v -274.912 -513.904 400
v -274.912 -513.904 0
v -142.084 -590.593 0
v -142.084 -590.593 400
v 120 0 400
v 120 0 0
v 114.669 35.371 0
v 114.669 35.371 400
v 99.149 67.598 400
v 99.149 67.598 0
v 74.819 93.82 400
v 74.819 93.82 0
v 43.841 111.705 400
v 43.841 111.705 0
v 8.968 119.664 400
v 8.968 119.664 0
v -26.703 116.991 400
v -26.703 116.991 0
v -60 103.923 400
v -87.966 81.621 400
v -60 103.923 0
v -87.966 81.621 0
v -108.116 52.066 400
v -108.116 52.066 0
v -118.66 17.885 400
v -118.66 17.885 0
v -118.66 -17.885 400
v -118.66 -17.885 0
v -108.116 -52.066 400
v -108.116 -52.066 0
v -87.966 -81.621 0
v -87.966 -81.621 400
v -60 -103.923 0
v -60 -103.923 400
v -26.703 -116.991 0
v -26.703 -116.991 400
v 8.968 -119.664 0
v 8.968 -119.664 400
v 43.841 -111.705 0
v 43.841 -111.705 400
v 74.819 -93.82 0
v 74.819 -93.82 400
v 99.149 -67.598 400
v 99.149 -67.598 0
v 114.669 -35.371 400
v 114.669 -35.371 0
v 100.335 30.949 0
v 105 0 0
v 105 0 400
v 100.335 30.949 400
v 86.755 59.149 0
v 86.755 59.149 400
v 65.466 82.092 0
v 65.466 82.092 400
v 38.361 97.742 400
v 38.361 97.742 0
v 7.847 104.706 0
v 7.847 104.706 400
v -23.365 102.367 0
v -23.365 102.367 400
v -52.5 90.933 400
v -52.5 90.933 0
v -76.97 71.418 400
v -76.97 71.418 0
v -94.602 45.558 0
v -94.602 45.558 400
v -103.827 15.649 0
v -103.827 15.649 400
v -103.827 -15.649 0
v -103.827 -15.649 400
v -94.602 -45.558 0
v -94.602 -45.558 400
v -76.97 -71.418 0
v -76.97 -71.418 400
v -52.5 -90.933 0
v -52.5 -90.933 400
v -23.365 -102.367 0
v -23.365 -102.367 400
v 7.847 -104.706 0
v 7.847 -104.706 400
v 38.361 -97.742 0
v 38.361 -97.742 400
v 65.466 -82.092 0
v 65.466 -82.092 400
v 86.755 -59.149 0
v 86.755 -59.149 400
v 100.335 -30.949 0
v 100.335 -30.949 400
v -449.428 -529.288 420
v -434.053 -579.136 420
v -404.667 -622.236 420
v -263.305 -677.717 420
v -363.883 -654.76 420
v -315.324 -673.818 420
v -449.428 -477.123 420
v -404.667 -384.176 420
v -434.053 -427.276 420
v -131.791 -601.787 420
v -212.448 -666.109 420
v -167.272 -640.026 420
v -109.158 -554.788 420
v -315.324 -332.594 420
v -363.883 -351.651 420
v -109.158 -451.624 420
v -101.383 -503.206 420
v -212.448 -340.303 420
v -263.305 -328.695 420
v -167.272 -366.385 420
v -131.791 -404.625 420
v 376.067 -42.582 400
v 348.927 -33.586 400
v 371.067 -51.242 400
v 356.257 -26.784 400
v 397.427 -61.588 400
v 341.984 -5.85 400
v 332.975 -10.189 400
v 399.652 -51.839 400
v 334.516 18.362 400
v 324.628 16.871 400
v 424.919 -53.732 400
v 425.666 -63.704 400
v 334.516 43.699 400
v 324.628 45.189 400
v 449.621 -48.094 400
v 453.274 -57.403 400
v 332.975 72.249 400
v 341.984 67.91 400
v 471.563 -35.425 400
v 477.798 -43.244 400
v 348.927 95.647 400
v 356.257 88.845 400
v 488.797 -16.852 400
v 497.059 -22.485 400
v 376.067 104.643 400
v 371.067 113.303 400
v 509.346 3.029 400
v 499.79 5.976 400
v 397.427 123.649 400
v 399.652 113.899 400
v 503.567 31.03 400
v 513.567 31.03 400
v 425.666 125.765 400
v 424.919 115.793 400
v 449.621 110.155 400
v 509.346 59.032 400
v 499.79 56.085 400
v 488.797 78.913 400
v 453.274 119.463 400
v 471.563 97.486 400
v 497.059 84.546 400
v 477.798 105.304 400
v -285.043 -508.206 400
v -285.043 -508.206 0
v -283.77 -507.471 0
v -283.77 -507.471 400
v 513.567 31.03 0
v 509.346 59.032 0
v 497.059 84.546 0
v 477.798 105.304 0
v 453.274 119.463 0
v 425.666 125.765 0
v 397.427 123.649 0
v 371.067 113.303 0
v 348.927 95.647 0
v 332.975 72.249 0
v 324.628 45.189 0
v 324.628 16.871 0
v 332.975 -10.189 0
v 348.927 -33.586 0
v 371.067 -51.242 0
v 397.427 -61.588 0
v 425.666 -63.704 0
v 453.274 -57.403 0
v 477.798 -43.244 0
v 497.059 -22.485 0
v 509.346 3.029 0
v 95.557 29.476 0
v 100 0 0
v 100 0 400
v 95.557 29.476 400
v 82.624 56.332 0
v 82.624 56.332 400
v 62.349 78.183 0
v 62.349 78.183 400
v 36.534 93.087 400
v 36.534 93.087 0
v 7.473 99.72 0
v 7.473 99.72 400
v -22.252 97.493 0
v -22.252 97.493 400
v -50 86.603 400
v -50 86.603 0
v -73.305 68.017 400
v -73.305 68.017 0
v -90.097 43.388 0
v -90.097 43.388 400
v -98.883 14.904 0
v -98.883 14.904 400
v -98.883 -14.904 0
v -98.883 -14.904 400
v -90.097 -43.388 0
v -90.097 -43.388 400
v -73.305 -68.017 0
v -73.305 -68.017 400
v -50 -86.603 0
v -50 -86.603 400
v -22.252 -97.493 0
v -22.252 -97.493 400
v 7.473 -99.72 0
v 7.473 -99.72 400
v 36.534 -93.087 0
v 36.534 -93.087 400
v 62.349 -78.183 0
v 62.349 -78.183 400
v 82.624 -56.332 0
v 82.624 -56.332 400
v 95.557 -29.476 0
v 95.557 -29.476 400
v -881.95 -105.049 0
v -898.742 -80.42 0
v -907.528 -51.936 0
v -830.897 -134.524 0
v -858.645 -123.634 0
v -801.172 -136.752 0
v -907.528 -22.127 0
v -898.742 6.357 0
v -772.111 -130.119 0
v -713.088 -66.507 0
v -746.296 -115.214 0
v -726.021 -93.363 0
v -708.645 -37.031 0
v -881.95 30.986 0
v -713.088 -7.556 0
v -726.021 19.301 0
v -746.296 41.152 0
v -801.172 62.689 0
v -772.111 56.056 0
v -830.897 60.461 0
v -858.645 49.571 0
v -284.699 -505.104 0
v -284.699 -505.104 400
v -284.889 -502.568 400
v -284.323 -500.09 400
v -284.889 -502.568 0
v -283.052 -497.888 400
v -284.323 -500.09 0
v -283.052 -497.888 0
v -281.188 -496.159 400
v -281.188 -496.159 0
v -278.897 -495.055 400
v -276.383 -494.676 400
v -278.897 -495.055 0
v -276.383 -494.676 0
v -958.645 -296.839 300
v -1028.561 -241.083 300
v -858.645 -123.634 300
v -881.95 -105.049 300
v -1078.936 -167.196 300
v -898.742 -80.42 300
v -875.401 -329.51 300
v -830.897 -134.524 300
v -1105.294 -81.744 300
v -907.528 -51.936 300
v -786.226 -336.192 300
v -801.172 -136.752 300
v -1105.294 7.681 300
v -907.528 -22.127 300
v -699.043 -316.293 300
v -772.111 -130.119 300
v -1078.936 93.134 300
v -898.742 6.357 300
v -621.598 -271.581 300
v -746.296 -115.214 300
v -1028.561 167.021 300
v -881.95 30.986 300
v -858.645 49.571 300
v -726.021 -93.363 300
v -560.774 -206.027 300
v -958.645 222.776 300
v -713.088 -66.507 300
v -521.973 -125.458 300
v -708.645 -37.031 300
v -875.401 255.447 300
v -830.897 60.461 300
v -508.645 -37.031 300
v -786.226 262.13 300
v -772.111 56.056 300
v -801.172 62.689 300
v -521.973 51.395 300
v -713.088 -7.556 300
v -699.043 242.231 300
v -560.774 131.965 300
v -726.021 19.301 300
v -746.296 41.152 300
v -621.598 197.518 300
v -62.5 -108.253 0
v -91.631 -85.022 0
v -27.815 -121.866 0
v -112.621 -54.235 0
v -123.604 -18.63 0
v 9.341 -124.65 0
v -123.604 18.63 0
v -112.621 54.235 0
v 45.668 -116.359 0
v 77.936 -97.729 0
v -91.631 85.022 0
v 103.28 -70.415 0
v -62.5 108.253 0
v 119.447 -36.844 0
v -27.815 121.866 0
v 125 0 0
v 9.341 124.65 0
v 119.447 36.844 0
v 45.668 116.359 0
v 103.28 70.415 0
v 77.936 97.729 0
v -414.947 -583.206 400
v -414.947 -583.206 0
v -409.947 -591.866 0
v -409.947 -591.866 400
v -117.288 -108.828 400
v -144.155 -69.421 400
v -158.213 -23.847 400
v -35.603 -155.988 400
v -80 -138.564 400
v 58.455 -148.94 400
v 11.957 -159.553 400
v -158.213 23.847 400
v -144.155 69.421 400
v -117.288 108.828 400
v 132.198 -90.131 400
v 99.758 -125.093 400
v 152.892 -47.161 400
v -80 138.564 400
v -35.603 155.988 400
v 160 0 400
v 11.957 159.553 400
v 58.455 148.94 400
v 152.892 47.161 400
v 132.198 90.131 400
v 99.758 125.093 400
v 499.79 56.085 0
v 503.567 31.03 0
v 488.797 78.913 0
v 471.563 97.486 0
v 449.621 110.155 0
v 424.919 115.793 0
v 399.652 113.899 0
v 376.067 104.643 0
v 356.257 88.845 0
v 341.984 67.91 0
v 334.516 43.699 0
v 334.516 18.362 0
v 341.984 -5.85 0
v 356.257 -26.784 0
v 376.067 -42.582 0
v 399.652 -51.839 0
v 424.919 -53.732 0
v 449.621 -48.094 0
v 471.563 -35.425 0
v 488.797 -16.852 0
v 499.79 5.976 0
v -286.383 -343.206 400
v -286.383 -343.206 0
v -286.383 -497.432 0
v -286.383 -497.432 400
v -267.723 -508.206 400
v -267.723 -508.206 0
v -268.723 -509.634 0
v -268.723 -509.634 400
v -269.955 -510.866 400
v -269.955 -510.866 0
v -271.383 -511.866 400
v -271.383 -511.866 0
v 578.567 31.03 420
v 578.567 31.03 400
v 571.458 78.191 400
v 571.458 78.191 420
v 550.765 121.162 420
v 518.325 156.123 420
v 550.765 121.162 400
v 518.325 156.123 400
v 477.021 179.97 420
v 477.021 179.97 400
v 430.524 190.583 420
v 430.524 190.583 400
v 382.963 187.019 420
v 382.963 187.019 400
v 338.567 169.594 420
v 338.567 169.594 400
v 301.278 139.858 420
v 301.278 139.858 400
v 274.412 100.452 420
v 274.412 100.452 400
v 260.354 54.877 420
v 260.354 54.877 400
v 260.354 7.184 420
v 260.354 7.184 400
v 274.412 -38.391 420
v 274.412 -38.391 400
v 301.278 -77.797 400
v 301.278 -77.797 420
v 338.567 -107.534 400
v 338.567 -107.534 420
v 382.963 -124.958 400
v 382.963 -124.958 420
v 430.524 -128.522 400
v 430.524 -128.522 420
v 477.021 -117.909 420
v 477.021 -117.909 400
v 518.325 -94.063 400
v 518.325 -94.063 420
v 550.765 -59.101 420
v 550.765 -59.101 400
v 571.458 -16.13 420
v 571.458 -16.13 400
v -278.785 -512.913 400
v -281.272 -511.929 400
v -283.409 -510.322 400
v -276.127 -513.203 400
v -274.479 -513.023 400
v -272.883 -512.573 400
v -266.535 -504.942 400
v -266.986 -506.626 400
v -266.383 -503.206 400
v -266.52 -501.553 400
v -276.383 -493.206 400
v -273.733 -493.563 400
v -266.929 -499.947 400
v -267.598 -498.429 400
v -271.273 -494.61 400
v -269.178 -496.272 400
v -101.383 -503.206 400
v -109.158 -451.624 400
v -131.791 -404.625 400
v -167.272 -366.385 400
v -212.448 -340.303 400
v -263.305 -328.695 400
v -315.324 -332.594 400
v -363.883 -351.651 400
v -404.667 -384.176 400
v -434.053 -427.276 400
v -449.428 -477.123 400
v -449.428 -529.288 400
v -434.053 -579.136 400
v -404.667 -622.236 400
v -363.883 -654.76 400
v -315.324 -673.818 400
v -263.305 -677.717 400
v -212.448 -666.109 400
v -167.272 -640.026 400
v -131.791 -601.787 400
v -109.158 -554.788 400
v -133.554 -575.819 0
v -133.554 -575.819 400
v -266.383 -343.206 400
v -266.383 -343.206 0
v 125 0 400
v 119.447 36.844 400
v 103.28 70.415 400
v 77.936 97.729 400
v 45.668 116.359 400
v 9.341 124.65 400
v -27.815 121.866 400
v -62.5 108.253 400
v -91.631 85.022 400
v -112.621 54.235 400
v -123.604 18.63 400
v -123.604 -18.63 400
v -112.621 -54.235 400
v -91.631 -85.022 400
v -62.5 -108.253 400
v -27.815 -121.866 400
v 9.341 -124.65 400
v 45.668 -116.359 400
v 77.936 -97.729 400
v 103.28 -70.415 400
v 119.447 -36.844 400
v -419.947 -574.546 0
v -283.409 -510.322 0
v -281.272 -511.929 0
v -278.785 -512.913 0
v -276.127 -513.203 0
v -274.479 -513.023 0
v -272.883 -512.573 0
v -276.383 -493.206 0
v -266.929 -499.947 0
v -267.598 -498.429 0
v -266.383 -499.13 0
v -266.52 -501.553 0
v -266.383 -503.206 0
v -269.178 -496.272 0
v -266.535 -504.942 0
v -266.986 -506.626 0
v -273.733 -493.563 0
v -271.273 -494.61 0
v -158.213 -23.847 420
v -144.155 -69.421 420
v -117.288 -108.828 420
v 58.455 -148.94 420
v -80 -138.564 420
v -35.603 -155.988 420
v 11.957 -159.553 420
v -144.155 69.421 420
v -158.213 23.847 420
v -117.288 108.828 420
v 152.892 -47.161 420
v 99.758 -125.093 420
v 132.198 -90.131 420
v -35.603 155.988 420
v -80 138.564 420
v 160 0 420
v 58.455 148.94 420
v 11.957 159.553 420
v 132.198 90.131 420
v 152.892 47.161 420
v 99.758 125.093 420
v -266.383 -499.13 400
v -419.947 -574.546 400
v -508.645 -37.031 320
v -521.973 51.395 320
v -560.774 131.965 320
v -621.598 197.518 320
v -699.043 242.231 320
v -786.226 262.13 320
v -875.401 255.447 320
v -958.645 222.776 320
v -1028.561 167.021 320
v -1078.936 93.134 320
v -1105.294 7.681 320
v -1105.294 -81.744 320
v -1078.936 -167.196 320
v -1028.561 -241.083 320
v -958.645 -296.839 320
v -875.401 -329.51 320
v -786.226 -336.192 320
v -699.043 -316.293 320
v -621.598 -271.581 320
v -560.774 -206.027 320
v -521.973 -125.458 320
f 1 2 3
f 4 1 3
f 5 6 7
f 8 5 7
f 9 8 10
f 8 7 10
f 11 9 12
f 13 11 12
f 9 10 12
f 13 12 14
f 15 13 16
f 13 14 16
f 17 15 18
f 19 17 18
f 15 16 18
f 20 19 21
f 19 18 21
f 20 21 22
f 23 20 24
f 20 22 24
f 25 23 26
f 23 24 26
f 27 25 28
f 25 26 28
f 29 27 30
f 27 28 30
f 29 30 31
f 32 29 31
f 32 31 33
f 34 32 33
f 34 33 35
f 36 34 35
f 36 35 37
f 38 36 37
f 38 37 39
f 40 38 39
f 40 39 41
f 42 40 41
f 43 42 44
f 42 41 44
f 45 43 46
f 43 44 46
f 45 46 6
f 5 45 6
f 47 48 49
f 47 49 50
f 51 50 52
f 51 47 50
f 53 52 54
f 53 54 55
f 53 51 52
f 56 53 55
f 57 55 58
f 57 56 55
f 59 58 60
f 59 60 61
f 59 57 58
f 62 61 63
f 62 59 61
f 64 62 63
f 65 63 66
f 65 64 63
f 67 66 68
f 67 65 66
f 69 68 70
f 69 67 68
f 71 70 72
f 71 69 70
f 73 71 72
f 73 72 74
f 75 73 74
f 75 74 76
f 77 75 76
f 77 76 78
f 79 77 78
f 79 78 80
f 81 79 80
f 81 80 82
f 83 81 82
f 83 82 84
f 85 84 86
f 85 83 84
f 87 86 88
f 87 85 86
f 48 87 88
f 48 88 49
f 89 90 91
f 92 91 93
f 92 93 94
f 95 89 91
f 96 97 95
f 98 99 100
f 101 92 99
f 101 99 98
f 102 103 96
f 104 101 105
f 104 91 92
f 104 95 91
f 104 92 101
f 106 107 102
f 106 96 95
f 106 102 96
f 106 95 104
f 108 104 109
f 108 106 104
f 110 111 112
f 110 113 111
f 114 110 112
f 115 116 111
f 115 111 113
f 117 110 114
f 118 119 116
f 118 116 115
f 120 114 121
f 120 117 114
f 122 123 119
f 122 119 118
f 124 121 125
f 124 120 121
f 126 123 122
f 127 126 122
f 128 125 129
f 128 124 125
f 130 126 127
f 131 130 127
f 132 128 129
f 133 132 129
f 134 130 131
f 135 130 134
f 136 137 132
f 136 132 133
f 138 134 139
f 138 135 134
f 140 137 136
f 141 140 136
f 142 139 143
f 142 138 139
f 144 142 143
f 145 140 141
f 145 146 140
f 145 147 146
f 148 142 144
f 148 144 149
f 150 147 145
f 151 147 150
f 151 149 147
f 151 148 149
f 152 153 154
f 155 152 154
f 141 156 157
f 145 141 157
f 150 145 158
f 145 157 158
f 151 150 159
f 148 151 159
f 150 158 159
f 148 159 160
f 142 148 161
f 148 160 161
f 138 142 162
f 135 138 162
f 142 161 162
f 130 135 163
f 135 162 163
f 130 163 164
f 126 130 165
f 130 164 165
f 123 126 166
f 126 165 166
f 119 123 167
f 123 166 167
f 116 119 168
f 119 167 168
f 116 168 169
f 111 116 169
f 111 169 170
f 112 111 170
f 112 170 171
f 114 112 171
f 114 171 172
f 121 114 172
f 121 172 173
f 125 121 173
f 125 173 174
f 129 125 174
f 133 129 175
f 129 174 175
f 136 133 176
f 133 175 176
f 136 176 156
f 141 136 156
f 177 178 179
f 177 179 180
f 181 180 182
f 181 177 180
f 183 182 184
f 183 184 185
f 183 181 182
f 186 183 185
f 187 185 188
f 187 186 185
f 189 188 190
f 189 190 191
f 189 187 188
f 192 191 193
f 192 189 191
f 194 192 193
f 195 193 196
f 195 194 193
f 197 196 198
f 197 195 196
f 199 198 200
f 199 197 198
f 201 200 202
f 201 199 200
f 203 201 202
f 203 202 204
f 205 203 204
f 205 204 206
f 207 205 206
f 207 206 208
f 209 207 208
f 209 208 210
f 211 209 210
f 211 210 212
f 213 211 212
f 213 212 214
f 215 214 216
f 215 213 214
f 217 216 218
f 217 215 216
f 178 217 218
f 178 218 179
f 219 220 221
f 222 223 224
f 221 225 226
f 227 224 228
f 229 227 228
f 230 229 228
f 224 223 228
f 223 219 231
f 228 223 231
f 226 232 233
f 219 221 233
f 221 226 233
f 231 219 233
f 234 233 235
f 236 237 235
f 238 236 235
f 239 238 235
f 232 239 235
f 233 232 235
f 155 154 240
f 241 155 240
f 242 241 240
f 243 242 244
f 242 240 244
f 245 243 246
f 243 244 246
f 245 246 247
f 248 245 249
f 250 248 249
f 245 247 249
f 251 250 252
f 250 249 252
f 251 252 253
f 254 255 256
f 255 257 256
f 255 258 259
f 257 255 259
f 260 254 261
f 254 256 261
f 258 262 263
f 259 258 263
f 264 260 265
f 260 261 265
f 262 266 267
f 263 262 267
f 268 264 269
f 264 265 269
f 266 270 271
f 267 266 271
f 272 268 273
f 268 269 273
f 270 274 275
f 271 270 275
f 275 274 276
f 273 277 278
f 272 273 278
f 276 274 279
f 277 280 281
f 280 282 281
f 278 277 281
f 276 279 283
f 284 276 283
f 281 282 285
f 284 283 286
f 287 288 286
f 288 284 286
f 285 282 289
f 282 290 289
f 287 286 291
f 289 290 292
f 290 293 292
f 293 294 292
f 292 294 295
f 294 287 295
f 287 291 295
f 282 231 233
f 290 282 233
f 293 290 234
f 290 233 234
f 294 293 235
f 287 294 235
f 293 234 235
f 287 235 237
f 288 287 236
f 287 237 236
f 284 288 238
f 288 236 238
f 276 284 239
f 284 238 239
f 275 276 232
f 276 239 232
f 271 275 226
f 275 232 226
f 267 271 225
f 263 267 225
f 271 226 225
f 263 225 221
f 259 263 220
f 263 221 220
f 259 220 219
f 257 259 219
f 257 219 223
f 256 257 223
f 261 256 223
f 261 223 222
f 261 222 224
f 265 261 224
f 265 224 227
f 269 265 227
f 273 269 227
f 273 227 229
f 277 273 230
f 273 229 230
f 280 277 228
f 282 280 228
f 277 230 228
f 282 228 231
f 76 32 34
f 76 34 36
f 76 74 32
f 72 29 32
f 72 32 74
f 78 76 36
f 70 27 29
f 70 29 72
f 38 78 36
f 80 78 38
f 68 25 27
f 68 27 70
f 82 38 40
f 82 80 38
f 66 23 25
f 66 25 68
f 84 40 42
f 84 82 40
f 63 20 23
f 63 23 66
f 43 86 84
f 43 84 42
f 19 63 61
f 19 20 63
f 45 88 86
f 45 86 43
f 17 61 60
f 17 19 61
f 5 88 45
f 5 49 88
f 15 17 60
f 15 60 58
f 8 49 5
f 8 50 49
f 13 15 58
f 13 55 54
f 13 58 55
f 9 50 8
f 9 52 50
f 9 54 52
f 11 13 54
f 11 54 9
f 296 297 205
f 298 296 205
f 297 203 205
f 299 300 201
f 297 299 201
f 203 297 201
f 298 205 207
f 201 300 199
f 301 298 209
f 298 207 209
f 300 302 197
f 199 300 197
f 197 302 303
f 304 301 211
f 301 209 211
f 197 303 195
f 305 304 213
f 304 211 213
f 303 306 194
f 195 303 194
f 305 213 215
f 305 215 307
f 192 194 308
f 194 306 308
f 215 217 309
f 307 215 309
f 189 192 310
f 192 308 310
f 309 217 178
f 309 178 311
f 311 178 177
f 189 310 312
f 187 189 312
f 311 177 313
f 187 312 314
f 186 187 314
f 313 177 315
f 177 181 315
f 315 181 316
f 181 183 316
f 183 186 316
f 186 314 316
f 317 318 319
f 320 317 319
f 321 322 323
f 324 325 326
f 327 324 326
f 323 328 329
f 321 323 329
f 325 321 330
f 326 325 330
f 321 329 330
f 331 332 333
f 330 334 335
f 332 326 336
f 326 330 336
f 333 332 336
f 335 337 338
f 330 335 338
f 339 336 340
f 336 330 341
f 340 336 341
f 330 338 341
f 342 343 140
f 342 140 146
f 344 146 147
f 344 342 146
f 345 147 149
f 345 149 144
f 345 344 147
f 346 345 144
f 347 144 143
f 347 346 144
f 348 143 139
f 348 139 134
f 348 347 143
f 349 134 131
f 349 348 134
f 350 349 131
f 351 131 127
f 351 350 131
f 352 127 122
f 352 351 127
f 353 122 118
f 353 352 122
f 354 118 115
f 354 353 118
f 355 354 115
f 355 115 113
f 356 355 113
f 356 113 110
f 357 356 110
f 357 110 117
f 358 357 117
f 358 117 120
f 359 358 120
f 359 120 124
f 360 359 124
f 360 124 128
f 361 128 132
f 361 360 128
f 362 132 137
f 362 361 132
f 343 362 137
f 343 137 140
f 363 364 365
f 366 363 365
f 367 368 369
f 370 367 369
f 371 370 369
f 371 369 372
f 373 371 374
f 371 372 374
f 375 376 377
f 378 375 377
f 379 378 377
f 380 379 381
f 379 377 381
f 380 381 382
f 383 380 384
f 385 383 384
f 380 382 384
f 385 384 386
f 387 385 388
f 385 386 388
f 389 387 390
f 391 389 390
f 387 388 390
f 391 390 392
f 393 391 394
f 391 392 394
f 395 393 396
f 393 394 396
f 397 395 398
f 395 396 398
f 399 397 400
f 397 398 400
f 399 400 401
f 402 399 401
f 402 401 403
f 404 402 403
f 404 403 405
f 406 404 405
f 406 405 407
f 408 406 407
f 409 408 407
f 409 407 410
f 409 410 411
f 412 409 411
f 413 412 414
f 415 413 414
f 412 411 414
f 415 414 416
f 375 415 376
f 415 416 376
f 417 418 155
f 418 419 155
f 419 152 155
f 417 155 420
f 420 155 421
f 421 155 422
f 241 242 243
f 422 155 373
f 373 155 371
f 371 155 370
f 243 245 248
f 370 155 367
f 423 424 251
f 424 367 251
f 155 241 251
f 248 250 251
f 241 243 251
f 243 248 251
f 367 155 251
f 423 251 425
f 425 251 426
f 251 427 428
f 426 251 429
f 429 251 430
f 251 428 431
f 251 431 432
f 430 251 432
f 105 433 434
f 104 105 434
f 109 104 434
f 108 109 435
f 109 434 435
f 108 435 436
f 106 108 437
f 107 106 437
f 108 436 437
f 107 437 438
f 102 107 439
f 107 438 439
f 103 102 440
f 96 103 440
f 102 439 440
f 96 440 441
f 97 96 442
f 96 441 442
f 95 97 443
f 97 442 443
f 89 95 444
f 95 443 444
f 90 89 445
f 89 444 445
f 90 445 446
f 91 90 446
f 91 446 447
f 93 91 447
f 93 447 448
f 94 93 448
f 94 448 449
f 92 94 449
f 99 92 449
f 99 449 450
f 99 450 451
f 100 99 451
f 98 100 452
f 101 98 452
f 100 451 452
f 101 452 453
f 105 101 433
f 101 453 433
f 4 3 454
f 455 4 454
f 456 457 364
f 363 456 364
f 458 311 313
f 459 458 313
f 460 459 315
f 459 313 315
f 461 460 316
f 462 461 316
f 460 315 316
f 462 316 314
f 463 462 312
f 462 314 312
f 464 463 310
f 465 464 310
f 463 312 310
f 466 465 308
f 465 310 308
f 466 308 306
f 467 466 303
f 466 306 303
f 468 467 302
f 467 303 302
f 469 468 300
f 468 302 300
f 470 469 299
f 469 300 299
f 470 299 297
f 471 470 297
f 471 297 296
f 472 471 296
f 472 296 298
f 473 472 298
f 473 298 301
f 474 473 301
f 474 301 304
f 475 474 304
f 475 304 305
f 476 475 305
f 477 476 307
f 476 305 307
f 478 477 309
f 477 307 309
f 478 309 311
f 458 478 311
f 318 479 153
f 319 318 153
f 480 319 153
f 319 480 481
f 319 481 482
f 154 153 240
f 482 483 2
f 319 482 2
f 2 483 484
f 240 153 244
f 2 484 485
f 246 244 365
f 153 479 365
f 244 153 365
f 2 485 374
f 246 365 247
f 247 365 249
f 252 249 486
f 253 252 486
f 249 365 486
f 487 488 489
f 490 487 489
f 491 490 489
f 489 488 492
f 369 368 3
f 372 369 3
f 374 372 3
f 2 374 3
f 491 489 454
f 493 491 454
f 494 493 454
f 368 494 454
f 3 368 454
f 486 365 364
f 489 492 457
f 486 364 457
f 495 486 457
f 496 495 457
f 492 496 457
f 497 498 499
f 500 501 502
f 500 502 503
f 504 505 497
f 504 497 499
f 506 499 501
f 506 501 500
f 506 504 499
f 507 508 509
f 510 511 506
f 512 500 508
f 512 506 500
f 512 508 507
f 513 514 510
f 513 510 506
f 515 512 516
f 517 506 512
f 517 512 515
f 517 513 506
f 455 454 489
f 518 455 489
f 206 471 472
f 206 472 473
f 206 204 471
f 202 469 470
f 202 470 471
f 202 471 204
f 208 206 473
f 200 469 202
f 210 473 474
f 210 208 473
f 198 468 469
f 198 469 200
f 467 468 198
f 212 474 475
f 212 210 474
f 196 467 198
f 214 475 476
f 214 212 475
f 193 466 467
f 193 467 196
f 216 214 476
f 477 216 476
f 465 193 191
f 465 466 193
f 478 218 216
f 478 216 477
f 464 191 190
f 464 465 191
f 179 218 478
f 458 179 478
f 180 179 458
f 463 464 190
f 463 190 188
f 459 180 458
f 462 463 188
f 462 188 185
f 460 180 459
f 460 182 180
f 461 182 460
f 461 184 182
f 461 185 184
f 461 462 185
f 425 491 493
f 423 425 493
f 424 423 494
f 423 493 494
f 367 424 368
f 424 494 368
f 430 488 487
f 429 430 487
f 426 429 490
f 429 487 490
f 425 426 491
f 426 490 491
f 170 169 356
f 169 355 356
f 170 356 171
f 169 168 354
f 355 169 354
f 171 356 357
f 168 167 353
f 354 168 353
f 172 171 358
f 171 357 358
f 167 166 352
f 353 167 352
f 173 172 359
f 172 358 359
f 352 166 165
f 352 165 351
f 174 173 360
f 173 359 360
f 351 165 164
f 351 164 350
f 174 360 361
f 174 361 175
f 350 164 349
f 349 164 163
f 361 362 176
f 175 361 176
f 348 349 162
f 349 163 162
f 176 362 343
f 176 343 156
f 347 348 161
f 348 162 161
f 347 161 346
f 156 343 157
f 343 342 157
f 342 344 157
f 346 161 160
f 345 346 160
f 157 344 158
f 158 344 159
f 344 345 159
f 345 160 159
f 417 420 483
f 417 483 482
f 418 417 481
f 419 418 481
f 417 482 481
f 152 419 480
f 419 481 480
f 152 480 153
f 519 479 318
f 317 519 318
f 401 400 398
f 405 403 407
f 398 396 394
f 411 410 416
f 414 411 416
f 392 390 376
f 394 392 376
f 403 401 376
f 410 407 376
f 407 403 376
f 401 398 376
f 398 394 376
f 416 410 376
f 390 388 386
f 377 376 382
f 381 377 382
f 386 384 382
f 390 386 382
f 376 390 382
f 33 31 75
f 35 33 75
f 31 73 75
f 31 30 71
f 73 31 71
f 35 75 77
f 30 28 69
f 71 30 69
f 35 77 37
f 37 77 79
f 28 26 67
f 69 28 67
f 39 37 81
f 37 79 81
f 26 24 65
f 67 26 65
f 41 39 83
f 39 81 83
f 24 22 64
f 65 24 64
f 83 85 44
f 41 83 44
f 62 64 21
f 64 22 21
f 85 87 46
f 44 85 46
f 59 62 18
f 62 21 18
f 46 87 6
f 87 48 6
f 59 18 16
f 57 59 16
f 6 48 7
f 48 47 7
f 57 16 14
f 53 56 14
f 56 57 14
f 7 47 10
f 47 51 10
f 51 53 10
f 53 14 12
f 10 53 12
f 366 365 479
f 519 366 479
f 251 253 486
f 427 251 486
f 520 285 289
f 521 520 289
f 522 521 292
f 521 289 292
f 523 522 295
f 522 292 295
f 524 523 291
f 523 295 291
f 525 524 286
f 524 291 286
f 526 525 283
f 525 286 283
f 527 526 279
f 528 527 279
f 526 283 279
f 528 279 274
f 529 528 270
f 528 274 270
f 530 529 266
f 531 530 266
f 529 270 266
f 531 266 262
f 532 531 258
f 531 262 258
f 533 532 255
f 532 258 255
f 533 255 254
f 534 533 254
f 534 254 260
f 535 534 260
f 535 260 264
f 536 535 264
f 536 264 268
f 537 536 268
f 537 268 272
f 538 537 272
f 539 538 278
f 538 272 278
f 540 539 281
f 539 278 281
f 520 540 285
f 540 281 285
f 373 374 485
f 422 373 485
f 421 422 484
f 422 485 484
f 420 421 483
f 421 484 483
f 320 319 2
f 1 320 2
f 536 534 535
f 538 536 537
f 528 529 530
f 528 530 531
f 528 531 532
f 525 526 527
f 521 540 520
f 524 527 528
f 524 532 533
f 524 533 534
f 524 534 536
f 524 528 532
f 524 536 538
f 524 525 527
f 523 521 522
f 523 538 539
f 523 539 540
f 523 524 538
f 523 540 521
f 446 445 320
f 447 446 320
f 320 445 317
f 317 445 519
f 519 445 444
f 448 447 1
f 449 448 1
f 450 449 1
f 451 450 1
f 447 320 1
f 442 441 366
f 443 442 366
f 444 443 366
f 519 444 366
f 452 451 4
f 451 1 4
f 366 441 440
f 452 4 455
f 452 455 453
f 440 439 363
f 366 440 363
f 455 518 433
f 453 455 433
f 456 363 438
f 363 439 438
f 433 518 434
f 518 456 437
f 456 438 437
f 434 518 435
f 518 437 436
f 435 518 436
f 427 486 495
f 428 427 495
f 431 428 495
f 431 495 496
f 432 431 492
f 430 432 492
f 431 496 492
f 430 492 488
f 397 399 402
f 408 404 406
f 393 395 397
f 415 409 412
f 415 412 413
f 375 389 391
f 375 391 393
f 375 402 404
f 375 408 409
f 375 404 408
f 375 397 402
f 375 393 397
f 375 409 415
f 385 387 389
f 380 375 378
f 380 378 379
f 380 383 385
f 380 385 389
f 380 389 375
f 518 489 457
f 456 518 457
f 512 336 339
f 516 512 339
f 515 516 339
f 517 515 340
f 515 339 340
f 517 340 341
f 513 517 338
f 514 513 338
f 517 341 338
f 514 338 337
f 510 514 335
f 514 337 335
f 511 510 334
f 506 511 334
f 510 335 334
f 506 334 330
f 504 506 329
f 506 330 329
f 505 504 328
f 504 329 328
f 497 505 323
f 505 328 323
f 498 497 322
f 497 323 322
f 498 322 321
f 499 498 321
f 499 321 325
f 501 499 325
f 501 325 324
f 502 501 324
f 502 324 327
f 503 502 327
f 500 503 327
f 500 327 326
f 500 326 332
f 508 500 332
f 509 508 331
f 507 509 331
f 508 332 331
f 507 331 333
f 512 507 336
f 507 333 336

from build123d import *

# Parameters (mm, degrees)
F0_R      = 125
F0_R_2    = 100
F1_DEPTH  = 400
F2_R      = 120
F2_R_2    = 105
F3_DEPTH  = 400
F4_R      = 160
F5_DEPTH  = 20
F6_R      = 95
F6_R_2    = 85
F7_DEPTH  = 400
F8_R      = 160
F9_DEPTH  = 20
F10_R     = 100
F11_DEPTH = 300
F12_R     = 300
F13_DEPTH = 20
F15_DEPTH = 400
F16_R     = 175
F17_DEPTH = 20


with BuildPart() as f1:
    # F0 (on Top) → F1 (new body)
    with BuildSketch(Plane.XY):
        Circle(F0_R)
        Circle(F0_R_2, mode=Mode.SUBTRACT)
    extrude(amount=F1_DEPTH)


with BuildPart() as f3:
    # F2 (on Top) → F3 (new body, through all)
    with BuildSketch(Plane.XY):
        Circle(F2_R)
        Circle(F2_R_2, mode=Mode.SUBTRACT)
    extrude(amount=F3_DEPTH)


with BuildPart() as f5:
    # F4 (on face) → F5 (new body)
    with BuildSketch(Plane.XY.offset(400)):
        Circle(F4_R)
    extrude(amount=F5_DEPTH)


with BuildPart() as f7:
    # F6 (on Top) → F7 (new body)
    with BuildSketch(Plane.XY):
        with Locations((418.5667335987, 31.0303624719)):
            Circle(F6_R)
        with Locations((418.5667335987, 31.0303624719)):
            Circle(F6_R_2, mode=Mode.SUBTRACT)
    extrude(amount=F7_DEPTH)


with BuildPart() as f9:
    # F8 (on face) → F9 (new body)
    with BuildSketch(Plane.XY.offset(400)):
        with Locations((418.5667335987, 31.0303624719)):
            Circle(F8_R)
    extrude(amount=F9_DEPTH)


with BuildPart() as f11:
    # F10 (on Top) → F11 (new body)
    with BuildSketch(Plane.XY):
        with Locations((-808.6451888084, -37.0312966406)):
            Circle(F10_R)
    extrude(amount=F11_DEPTH)

    # F12 (on face) → F13 (join)
    with BuildSketch(Plane.XY.offset(300)):
        with Locations((-808.6451888084, -37.0312966406)):
            Circle(F12_R)
    extrude(amount=F13_DEPTH)


with BuildPart() as f15:
    # F14 (on Top) → F15 (new body)
    with BuildSketch(Plane.XY):
        with BuildLine():
            Line((-266.382997632, -343.2058954239), (-276.382997632, -343.2058954239))
            Line((-276.382997632, -343.2058954239), (-276.382997632, -493.2058954239))
            ThreePointArc((-276.382997632, -493.2058954239), (-271.2725924302, -494.6103292021), (-267.5976323655, -498.4291436894))
            Line((-267.5976323655, -498.4291436894), (-266.382997632, -499.1304133797))
            Line((-266.382997632, -499.1304133797), (-266.382997632, -343.2058954239))
        make_face()
        with BuildLine():
            Line((-276.382997632, -493.2058954239), (-276.382997632, -343.2058954239))
            Line((-276.382997632, -343.2058954239), (-286.382997632, -343.2058954239))
            Line((-286.382997632, -343.2058954239), (-286.382997632, -497.432392732))
            Line((-286.382997632, -497.432392732), (-281.382997632, -494.545641386))
            ThreePointArc((-281.382997632, -494.545641386), (-278.9711880831, -493.546637161), (-276.382997632, -493.2058954239))
        make_face()
        with BuildLine():
            Line((-276.382997632, -494.6764244409), (-276.382997632, -493.2058954239))
            ThreePointArc((-276.382997632, -493.2058954239), (-278.9711880831, -493.546637161), (-281.382997632, -494.545641386))
            Line((-281.382997632, -494.545641386), (-286.382997632, -497.432392732))
            Line((-286.382997632, -497.432392732), (-286.382997632, -503.2058954239))
            ThreePointArc((-286.382997632, -503.2058954239), (-286.0422558949, -505.7940858749), (-285.0432516699, -508.2058954239))
            Line((-285.0432516699, -508.2058954239), (-283.7697361841, -507.4706309154))
            ThreePointArc((-283.7697361841, -507.4706309154), (-283.7697361841, -498.9411599324), (-276.382997632, -494.6764244409))
        make_face()
        with BuildLine():
            Line((-266.382997632, -499.1304133797), (-267.5976323655, -498.4291436894))
            ThreePointArc((-267.5976323655, -498.4291436894), (-266.6914122956, -500.7415144332), (-266.382997632, -503.2058954239))
            Line((-266.382997632, -503.2058954239), (-266.382997632, -499.1304133797))
        make_face()
        with BuildLine():
            Line((-286.382997632, -503.2058954239), (-286.382997632, -497.432392732))
            Line((-286.382997632, -497.432392732), (-419.9470622375, -574.545641386))
            Line((-419.9470622375, -574.545641386), (-414.9470622375, -583.2058954239))
            Line((-414.9470622375, -583.2058954239), (-285.0432516699, -508.2058954239))
            ThreePointArc((-285.0432516699, -508.2058954239), (-286.0422558949, -505.7940858749), (-286.382997632, -503.2058954239))
        make_face()
        with BuildLine():
            Line((-133.554197535, -575.8191568718), (-266.382997632, -499.1304133797))
            Line((-266.382997632, -499.1304133797), (-266.382997632, -503.2058954239))
            ThreePointArc((-266.382997632, -503.2058954239), (-266.7237393691, -505.7940858749), (-267.7227435942, -508.2058954239))
            Line((-267.7227435942, -508.2058954239), (-137.8189330265, -583.2058954239))
            Line((-137.8189330265, -583.2058954239), (-133.554197535, -575.8191568718))
        make_face()
        with BuildLine():
            Line((-137.8189330265, -583.2058954239), (-267.7227435942, -508.2058954239))
            ThreePointArc((-267.7227435942, -508.2058954239), (-269.3119298202, -510.2769632358), (-271.382997632, -511.8661494617))
            Line((-271.382997632, -511.8661494617), (-274.912468615, -513.9038904838))
            Line((-274.912468615, -513.9038904838), (-142.083668518, -590.592633976))
            Line((-142.083668518, -590.592633976), (-137.8189330265, -583.2058954239))
        make_face()
        with BuildLine():
            ThreePointArc((-276.1271033484, -513.2026207935), (-281.271773739, -511.9294192632), (-285.0432516699, -508.2058954239))
            Line((-285.0432516699, -508.2058954239), (-414.9470622375, -583.2058954239))
            Line((-414.9470622375, -583.2058954239), (-409.9470622375, -591.8661494617))
            Line((-409.9470622375, -591.8661494617), (-274.912468615, -513.9038904838))
            Line((-274.912468615, -513.9038904838), (-276.1271033484, -513.2026207935))
        make_face()
        with BuildLine():
            Line((-274.912468615, -513.9038904838), (-271.382997632, -511.8661494617))
            ThreePointArc((-271.382997632, -511.8661494617), (-273.6714215064, -512.8312450235), (-276.1271033484, -513.2026207935))
            Line((-276.1271033484, -513.2026207935), (-274.912468615, -513.9038904838))
        make_face()
    extrude(amount=F15_DEPTH)

    # F16 (on face) → F17 (join)
    with BuildSketch(Plane.XY.offset(400)):
        with Locations((-276.382997632, -503.2058954239)):
            Circle(F16_R)
    extrude(amount=F17_DEPTH)


solid = Compound([f1.part, f3.part, f5.part, f7.part, f9.part, f11.part, f15.part])
